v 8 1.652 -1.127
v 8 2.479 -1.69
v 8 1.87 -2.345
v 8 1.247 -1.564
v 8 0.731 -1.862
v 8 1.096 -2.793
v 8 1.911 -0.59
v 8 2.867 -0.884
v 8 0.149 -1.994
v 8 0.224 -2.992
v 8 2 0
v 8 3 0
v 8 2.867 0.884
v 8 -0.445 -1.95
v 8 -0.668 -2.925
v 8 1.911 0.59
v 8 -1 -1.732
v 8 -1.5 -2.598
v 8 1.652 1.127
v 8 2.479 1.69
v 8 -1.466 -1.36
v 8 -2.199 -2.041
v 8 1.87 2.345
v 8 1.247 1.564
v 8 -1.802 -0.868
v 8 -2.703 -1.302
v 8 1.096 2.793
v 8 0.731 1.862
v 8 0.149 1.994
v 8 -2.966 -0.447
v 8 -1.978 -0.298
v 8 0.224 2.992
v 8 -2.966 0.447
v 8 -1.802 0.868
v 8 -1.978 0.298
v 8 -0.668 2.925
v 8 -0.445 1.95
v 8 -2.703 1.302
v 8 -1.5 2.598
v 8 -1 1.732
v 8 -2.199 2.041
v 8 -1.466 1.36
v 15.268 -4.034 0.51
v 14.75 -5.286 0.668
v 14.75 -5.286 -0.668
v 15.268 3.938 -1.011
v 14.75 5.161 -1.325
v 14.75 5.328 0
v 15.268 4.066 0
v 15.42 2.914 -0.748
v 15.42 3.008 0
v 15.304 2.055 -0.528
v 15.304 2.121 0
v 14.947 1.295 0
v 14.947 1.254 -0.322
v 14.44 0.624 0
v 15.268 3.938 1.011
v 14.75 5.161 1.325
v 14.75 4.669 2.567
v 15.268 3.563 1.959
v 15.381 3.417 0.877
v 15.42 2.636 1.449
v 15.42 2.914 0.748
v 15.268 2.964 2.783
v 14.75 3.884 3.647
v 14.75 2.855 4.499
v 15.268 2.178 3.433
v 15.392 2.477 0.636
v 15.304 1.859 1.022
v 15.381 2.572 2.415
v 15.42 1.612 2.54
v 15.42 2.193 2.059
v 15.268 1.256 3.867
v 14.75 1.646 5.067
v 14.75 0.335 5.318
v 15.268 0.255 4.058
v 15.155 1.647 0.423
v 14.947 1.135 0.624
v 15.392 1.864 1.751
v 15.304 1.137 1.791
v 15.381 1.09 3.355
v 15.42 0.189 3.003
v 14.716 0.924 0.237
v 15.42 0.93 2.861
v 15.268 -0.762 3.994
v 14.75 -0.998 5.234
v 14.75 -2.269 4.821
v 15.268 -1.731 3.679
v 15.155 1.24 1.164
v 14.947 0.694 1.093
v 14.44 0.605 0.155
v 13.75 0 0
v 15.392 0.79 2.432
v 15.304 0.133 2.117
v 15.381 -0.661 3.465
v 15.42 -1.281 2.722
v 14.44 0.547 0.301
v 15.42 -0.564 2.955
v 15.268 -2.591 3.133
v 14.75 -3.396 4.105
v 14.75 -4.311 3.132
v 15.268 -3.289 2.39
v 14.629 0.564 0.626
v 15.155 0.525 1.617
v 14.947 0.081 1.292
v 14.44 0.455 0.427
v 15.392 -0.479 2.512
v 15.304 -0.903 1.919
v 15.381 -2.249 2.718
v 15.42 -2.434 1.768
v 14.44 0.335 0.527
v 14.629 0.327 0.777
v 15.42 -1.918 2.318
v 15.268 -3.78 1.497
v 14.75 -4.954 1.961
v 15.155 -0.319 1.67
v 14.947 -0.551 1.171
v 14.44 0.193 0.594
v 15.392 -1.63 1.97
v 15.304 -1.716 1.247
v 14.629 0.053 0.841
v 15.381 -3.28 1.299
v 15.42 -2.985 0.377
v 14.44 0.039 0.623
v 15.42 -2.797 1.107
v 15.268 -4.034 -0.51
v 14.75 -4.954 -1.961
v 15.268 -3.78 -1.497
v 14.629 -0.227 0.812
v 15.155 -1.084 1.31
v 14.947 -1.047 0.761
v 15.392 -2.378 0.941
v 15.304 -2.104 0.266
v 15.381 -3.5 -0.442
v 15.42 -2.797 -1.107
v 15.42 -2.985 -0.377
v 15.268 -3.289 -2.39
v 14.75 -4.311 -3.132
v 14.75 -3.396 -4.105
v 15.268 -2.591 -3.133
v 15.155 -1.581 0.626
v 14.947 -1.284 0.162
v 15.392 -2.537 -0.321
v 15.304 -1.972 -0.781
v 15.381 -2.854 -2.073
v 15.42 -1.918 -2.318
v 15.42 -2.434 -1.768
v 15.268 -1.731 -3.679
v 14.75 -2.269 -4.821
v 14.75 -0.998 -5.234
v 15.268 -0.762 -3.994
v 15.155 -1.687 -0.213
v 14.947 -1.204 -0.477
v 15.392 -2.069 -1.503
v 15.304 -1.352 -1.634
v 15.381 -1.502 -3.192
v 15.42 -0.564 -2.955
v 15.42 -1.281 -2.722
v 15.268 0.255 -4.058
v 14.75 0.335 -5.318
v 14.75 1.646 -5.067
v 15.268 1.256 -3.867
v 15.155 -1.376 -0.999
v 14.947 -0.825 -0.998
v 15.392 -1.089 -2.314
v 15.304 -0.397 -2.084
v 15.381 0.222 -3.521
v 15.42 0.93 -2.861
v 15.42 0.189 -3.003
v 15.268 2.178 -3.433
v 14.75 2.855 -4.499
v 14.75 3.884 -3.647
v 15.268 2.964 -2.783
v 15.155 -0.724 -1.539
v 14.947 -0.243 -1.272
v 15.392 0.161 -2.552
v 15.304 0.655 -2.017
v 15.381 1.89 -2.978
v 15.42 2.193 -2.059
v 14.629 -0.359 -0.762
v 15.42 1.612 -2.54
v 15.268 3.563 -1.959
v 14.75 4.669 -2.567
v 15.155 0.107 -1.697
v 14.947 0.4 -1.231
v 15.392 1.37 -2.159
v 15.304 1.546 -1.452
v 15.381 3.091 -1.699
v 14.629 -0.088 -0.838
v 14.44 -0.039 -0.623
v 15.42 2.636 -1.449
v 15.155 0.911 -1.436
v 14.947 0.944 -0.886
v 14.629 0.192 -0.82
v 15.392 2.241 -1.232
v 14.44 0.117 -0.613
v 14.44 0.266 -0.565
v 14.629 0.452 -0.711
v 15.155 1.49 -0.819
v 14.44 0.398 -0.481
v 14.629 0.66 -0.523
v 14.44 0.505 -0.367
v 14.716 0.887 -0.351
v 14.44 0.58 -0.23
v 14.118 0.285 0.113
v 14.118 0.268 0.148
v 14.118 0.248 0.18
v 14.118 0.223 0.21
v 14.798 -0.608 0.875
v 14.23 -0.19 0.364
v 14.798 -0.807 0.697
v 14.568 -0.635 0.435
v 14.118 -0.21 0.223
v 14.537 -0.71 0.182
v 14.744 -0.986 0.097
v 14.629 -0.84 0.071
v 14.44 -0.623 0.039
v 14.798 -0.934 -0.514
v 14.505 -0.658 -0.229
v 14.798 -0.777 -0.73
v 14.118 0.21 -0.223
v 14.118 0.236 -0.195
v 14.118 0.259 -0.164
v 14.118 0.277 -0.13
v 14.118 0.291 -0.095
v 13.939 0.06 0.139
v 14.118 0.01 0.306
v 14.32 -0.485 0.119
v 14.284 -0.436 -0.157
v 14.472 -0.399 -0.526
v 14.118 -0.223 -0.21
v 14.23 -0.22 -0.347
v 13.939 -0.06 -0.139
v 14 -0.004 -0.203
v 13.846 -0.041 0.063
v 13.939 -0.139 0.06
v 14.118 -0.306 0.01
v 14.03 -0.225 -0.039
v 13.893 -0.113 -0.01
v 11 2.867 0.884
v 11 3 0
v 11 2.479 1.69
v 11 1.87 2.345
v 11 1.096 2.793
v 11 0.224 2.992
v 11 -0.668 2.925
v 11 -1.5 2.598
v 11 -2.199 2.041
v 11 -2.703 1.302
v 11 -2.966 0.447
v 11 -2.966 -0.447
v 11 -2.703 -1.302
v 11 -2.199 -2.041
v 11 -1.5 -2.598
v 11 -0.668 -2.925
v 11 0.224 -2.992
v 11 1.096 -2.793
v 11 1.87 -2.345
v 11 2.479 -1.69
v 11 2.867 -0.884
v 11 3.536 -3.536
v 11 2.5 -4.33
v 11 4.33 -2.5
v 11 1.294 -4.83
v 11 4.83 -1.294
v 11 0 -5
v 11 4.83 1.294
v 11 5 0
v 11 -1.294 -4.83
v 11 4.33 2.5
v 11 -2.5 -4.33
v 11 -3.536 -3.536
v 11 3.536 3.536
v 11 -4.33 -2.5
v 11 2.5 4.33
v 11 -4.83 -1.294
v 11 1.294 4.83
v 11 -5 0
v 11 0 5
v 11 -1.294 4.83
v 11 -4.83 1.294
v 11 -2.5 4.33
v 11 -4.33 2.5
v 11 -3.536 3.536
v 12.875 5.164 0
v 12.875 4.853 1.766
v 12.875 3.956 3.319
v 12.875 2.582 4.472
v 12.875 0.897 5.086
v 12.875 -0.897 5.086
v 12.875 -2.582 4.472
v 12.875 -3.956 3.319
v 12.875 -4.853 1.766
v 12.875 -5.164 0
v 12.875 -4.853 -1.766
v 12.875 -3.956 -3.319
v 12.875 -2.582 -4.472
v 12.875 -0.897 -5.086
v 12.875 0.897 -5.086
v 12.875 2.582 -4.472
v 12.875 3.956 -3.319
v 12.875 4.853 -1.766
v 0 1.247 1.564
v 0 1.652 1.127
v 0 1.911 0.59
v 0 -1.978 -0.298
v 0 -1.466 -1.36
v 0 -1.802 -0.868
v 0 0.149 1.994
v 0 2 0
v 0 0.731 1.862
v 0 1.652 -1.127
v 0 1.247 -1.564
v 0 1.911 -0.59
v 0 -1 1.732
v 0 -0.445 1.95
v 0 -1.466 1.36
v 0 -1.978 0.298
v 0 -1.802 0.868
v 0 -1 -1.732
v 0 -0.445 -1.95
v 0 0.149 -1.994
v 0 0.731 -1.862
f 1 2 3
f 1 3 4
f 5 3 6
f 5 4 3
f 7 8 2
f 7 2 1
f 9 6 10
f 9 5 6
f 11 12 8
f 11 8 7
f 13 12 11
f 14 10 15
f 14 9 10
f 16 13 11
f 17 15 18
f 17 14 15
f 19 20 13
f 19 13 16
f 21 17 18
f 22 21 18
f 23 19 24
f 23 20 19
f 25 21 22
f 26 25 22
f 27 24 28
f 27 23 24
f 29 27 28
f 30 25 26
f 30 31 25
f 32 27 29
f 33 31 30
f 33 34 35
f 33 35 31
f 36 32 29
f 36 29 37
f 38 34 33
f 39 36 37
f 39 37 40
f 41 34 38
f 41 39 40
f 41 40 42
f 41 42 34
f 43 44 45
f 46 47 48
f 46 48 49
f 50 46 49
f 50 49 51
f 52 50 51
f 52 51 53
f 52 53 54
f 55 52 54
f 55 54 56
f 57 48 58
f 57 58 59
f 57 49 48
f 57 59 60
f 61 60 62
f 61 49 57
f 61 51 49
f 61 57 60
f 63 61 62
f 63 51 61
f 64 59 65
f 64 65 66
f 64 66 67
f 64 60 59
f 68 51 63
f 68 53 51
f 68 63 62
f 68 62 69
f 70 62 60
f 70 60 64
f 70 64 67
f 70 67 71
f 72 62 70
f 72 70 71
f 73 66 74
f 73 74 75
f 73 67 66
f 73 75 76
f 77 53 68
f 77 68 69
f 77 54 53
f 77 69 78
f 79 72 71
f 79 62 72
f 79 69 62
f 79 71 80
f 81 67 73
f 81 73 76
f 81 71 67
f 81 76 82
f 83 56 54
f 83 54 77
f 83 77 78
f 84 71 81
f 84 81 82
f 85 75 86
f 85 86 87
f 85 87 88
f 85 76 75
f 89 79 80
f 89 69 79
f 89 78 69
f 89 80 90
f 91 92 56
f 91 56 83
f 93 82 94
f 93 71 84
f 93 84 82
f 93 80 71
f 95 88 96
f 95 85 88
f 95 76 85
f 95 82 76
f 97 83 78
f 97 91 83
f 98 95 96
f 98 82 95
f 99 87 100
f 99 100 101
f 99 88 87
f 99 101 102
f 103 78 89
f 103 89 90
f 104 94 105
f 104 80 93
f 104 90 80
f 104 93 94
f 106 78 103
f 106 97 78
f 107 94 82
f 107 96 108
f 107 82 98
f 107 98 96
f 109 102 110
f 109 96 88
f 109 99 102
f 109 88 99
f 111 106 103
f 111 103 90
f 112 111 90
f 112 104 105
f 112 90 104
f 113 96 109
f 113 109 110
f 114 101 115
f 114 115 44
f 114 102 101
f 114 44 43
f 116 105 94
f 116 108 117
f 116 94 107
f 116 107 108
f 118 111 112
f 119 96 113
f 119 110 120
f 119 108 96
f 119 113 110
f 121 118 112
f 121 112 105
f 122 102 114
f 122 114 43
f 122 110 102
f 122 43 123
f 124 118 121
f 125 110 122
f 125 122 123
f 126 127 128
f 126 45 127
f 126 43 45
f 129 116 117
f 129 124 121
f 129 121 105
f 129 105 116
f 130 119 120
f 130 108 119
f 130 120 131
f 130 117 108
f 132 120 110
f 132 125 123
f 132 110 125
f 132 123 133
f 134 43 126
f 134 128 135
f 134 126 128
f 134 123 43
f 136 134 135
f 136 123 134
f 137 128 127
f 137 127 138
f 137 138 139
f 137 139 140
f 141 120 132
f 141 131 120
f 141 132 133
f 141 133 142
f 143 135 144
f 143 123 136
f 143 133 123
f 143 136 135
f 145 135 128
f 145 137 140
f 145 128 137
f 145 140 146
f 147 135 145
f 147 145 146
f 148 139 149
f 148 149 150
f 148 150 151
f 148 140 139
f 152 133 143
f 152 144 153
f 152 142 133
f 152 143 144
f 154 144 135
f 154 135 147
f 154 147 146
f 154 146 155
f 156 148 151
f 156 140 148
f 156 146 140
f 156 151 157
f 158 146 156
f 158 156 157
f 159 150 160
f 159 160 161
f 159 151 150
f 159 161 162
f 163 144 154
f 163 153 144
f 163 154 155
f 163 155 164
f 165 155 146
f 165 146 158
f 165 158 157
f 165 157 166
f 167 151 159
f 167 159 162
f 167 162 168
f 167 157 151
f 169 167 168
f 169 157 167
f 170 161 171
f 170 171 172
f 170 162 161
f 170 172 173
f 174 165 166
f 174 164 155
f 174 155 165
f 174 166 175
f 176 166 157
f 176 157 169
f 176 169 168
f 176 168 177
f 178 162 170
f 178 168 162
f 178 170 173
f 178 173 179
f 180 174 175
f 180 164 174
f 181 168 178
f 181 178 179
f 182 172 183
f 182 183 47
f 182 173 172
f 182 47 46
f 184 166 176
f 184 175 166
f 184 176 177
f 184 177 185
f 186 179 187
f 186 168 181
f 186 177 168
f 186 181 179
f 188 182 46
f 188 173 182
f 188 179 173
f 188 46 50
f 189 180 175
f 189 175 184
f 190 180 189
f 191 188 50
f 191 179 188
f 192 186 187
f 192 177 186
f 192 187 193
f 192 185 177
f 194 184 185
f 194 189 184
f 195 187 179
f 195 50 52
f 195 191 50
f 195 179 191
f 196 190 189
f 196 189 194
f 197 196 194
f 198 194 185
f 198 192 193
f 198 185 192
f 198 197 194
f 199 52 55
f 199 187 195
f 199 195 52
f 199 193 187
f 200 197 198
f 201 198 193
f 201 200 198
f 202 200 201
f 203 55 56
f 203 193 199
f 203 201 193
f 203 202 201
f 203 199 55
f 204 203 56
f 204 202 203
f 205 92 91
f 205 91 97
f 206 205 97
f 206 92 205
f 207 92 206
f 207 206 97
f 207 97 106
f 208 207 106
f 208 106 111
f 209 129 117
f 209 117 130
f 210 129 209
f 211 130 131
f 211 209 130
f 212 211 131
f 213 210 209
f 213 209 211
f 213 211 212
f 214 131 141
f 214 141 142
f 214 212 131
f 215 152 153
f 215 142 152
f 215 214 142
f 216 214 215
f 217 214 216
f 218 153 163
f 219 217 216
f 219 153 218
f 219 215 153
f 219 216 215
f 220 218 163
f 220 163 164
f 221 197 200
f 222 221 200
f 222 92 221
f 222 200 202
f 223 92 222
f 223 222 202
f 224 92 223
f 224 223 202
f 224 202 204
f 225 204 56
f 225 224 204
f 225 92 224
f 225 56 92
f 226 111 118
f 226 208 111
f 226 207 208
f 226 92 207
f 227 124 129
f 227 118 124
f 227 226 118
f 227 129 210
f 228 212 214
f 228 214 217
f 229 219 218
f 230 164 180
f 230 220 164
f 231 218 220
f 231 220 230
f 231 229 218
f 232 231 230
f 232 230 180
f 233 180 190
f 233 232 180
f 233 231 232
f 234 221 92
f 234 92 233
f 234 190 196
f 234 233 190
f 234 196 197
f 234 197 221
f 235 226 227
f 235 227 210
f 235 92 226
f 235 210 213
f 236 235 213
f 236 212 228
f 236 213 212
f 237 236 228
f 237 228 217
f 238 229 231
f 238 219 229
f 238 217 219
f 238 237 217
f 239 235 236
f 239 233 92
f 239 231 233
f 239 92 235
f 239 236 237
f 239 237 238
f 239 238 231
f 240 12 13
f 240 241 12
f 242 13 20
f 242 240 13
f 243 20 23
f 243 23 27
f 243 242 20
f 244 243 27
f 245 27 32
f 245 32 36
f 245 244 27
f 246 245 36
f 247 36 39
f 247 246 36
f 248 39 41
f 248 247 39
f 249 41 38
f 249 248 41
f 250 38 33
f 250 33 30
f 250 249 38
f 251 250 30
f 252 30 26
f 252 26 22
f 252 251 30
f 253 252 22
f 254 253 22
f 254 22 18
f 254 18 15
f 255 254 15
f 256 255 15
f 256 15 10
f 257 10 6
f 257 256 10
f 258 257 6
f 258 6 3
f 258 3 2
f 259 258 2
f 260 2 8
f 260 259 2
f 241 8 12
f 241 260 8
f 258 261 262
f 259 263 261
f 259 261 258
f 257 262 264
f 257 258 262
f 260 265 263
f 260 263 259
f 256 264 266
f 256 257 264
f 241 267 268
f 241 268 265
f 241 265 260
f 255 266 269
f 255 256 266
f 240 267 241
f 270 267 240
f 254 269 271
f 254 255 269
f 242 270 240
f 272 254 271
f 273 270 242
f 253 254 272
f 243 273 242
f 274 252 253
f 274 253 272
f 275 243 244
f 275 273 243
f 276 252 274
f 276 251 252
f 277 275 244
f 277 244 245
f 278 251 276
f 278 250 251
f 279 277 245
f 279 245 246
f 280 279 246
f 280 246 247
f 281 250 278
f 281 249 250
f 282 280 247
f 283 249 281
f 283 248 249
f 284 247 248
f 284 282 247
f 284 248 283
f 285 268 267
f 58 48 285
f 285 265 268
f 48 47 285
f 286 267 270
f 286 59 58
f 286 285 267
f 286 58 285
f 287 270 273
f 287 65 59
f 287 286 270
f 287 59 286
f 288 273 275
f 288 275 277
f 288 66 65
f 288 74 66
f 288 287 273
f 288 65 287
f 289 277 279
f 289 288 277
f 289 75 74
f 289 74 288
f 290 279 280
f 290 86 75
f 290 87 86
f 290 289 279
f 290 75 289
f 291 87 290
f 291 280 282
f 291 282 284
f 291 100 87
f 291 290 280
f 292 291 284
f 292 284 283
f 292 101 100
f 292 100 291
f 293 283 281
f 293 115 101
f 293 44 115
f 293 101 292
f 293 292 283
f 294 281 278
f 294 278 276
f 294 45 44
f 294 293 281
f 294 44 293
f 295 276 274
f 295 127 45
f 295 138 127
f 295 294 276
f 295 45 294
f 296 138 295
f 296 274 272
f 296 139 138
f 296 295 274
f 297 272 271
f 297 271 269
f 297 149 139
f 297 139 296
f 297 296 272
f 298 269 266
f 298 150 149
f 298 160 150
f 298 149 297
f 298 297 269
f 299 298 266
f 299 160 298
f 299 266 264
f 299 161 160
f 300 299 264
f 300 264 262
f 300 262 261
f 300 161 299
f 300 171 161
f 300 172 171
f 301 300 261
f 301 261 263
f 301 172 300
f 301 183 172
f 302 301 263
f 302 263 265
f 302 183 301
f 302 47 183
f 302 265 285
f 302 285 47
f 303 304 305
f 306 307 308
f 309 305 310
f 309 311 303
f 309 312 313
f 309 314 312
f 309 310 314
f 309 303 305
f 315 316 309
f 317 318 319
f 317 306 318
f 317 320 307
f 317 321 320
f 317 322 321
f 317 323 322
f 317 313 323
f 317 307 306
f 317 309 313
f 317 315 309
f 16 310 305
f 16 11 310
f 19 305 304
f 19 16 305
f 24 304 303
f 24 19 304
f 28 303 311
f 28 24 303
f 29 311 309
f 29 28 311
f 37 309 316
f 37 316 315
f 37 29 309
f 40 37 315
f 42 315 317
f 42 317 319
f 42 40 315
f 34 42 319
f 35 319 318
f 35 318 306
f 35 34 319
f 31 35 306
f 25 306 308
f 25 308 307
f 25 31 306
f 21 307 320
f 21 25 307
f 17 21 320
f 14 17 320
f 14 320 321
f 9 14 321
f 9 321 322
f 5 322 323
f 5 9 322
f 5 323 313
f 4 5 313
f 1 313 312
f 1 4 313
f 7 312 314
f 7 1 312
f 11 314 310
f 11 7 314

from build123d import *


with BuildPart() as part:
    # Sketch2 → Revolve1 (revolve)
    with BuildSketch(Plane.XY):
        with BuildLine():
            Line((0, 0), (0, 2))
            Line((0, 2), (8, 2))
            Line((8, 2), (8, 3))
            Line((8, 3), (11, 3))
            Line((11, 3), (11, 5))
            Line((11, 5), (14.75, 5.328082488))
            add(Edge.make_bspline(
                [(14.75, 5.328082488), (16.478433804, 2.101172747), (13.75, 0)],
                knots=[0, 0, 0, 1, 1, 1], degree=2))
            Line((13.75, 0), (0, 0))
        make_face()
    revolve(axis=Axis((0, 0, 0), (1, 0, 0)))


solid = part.part
